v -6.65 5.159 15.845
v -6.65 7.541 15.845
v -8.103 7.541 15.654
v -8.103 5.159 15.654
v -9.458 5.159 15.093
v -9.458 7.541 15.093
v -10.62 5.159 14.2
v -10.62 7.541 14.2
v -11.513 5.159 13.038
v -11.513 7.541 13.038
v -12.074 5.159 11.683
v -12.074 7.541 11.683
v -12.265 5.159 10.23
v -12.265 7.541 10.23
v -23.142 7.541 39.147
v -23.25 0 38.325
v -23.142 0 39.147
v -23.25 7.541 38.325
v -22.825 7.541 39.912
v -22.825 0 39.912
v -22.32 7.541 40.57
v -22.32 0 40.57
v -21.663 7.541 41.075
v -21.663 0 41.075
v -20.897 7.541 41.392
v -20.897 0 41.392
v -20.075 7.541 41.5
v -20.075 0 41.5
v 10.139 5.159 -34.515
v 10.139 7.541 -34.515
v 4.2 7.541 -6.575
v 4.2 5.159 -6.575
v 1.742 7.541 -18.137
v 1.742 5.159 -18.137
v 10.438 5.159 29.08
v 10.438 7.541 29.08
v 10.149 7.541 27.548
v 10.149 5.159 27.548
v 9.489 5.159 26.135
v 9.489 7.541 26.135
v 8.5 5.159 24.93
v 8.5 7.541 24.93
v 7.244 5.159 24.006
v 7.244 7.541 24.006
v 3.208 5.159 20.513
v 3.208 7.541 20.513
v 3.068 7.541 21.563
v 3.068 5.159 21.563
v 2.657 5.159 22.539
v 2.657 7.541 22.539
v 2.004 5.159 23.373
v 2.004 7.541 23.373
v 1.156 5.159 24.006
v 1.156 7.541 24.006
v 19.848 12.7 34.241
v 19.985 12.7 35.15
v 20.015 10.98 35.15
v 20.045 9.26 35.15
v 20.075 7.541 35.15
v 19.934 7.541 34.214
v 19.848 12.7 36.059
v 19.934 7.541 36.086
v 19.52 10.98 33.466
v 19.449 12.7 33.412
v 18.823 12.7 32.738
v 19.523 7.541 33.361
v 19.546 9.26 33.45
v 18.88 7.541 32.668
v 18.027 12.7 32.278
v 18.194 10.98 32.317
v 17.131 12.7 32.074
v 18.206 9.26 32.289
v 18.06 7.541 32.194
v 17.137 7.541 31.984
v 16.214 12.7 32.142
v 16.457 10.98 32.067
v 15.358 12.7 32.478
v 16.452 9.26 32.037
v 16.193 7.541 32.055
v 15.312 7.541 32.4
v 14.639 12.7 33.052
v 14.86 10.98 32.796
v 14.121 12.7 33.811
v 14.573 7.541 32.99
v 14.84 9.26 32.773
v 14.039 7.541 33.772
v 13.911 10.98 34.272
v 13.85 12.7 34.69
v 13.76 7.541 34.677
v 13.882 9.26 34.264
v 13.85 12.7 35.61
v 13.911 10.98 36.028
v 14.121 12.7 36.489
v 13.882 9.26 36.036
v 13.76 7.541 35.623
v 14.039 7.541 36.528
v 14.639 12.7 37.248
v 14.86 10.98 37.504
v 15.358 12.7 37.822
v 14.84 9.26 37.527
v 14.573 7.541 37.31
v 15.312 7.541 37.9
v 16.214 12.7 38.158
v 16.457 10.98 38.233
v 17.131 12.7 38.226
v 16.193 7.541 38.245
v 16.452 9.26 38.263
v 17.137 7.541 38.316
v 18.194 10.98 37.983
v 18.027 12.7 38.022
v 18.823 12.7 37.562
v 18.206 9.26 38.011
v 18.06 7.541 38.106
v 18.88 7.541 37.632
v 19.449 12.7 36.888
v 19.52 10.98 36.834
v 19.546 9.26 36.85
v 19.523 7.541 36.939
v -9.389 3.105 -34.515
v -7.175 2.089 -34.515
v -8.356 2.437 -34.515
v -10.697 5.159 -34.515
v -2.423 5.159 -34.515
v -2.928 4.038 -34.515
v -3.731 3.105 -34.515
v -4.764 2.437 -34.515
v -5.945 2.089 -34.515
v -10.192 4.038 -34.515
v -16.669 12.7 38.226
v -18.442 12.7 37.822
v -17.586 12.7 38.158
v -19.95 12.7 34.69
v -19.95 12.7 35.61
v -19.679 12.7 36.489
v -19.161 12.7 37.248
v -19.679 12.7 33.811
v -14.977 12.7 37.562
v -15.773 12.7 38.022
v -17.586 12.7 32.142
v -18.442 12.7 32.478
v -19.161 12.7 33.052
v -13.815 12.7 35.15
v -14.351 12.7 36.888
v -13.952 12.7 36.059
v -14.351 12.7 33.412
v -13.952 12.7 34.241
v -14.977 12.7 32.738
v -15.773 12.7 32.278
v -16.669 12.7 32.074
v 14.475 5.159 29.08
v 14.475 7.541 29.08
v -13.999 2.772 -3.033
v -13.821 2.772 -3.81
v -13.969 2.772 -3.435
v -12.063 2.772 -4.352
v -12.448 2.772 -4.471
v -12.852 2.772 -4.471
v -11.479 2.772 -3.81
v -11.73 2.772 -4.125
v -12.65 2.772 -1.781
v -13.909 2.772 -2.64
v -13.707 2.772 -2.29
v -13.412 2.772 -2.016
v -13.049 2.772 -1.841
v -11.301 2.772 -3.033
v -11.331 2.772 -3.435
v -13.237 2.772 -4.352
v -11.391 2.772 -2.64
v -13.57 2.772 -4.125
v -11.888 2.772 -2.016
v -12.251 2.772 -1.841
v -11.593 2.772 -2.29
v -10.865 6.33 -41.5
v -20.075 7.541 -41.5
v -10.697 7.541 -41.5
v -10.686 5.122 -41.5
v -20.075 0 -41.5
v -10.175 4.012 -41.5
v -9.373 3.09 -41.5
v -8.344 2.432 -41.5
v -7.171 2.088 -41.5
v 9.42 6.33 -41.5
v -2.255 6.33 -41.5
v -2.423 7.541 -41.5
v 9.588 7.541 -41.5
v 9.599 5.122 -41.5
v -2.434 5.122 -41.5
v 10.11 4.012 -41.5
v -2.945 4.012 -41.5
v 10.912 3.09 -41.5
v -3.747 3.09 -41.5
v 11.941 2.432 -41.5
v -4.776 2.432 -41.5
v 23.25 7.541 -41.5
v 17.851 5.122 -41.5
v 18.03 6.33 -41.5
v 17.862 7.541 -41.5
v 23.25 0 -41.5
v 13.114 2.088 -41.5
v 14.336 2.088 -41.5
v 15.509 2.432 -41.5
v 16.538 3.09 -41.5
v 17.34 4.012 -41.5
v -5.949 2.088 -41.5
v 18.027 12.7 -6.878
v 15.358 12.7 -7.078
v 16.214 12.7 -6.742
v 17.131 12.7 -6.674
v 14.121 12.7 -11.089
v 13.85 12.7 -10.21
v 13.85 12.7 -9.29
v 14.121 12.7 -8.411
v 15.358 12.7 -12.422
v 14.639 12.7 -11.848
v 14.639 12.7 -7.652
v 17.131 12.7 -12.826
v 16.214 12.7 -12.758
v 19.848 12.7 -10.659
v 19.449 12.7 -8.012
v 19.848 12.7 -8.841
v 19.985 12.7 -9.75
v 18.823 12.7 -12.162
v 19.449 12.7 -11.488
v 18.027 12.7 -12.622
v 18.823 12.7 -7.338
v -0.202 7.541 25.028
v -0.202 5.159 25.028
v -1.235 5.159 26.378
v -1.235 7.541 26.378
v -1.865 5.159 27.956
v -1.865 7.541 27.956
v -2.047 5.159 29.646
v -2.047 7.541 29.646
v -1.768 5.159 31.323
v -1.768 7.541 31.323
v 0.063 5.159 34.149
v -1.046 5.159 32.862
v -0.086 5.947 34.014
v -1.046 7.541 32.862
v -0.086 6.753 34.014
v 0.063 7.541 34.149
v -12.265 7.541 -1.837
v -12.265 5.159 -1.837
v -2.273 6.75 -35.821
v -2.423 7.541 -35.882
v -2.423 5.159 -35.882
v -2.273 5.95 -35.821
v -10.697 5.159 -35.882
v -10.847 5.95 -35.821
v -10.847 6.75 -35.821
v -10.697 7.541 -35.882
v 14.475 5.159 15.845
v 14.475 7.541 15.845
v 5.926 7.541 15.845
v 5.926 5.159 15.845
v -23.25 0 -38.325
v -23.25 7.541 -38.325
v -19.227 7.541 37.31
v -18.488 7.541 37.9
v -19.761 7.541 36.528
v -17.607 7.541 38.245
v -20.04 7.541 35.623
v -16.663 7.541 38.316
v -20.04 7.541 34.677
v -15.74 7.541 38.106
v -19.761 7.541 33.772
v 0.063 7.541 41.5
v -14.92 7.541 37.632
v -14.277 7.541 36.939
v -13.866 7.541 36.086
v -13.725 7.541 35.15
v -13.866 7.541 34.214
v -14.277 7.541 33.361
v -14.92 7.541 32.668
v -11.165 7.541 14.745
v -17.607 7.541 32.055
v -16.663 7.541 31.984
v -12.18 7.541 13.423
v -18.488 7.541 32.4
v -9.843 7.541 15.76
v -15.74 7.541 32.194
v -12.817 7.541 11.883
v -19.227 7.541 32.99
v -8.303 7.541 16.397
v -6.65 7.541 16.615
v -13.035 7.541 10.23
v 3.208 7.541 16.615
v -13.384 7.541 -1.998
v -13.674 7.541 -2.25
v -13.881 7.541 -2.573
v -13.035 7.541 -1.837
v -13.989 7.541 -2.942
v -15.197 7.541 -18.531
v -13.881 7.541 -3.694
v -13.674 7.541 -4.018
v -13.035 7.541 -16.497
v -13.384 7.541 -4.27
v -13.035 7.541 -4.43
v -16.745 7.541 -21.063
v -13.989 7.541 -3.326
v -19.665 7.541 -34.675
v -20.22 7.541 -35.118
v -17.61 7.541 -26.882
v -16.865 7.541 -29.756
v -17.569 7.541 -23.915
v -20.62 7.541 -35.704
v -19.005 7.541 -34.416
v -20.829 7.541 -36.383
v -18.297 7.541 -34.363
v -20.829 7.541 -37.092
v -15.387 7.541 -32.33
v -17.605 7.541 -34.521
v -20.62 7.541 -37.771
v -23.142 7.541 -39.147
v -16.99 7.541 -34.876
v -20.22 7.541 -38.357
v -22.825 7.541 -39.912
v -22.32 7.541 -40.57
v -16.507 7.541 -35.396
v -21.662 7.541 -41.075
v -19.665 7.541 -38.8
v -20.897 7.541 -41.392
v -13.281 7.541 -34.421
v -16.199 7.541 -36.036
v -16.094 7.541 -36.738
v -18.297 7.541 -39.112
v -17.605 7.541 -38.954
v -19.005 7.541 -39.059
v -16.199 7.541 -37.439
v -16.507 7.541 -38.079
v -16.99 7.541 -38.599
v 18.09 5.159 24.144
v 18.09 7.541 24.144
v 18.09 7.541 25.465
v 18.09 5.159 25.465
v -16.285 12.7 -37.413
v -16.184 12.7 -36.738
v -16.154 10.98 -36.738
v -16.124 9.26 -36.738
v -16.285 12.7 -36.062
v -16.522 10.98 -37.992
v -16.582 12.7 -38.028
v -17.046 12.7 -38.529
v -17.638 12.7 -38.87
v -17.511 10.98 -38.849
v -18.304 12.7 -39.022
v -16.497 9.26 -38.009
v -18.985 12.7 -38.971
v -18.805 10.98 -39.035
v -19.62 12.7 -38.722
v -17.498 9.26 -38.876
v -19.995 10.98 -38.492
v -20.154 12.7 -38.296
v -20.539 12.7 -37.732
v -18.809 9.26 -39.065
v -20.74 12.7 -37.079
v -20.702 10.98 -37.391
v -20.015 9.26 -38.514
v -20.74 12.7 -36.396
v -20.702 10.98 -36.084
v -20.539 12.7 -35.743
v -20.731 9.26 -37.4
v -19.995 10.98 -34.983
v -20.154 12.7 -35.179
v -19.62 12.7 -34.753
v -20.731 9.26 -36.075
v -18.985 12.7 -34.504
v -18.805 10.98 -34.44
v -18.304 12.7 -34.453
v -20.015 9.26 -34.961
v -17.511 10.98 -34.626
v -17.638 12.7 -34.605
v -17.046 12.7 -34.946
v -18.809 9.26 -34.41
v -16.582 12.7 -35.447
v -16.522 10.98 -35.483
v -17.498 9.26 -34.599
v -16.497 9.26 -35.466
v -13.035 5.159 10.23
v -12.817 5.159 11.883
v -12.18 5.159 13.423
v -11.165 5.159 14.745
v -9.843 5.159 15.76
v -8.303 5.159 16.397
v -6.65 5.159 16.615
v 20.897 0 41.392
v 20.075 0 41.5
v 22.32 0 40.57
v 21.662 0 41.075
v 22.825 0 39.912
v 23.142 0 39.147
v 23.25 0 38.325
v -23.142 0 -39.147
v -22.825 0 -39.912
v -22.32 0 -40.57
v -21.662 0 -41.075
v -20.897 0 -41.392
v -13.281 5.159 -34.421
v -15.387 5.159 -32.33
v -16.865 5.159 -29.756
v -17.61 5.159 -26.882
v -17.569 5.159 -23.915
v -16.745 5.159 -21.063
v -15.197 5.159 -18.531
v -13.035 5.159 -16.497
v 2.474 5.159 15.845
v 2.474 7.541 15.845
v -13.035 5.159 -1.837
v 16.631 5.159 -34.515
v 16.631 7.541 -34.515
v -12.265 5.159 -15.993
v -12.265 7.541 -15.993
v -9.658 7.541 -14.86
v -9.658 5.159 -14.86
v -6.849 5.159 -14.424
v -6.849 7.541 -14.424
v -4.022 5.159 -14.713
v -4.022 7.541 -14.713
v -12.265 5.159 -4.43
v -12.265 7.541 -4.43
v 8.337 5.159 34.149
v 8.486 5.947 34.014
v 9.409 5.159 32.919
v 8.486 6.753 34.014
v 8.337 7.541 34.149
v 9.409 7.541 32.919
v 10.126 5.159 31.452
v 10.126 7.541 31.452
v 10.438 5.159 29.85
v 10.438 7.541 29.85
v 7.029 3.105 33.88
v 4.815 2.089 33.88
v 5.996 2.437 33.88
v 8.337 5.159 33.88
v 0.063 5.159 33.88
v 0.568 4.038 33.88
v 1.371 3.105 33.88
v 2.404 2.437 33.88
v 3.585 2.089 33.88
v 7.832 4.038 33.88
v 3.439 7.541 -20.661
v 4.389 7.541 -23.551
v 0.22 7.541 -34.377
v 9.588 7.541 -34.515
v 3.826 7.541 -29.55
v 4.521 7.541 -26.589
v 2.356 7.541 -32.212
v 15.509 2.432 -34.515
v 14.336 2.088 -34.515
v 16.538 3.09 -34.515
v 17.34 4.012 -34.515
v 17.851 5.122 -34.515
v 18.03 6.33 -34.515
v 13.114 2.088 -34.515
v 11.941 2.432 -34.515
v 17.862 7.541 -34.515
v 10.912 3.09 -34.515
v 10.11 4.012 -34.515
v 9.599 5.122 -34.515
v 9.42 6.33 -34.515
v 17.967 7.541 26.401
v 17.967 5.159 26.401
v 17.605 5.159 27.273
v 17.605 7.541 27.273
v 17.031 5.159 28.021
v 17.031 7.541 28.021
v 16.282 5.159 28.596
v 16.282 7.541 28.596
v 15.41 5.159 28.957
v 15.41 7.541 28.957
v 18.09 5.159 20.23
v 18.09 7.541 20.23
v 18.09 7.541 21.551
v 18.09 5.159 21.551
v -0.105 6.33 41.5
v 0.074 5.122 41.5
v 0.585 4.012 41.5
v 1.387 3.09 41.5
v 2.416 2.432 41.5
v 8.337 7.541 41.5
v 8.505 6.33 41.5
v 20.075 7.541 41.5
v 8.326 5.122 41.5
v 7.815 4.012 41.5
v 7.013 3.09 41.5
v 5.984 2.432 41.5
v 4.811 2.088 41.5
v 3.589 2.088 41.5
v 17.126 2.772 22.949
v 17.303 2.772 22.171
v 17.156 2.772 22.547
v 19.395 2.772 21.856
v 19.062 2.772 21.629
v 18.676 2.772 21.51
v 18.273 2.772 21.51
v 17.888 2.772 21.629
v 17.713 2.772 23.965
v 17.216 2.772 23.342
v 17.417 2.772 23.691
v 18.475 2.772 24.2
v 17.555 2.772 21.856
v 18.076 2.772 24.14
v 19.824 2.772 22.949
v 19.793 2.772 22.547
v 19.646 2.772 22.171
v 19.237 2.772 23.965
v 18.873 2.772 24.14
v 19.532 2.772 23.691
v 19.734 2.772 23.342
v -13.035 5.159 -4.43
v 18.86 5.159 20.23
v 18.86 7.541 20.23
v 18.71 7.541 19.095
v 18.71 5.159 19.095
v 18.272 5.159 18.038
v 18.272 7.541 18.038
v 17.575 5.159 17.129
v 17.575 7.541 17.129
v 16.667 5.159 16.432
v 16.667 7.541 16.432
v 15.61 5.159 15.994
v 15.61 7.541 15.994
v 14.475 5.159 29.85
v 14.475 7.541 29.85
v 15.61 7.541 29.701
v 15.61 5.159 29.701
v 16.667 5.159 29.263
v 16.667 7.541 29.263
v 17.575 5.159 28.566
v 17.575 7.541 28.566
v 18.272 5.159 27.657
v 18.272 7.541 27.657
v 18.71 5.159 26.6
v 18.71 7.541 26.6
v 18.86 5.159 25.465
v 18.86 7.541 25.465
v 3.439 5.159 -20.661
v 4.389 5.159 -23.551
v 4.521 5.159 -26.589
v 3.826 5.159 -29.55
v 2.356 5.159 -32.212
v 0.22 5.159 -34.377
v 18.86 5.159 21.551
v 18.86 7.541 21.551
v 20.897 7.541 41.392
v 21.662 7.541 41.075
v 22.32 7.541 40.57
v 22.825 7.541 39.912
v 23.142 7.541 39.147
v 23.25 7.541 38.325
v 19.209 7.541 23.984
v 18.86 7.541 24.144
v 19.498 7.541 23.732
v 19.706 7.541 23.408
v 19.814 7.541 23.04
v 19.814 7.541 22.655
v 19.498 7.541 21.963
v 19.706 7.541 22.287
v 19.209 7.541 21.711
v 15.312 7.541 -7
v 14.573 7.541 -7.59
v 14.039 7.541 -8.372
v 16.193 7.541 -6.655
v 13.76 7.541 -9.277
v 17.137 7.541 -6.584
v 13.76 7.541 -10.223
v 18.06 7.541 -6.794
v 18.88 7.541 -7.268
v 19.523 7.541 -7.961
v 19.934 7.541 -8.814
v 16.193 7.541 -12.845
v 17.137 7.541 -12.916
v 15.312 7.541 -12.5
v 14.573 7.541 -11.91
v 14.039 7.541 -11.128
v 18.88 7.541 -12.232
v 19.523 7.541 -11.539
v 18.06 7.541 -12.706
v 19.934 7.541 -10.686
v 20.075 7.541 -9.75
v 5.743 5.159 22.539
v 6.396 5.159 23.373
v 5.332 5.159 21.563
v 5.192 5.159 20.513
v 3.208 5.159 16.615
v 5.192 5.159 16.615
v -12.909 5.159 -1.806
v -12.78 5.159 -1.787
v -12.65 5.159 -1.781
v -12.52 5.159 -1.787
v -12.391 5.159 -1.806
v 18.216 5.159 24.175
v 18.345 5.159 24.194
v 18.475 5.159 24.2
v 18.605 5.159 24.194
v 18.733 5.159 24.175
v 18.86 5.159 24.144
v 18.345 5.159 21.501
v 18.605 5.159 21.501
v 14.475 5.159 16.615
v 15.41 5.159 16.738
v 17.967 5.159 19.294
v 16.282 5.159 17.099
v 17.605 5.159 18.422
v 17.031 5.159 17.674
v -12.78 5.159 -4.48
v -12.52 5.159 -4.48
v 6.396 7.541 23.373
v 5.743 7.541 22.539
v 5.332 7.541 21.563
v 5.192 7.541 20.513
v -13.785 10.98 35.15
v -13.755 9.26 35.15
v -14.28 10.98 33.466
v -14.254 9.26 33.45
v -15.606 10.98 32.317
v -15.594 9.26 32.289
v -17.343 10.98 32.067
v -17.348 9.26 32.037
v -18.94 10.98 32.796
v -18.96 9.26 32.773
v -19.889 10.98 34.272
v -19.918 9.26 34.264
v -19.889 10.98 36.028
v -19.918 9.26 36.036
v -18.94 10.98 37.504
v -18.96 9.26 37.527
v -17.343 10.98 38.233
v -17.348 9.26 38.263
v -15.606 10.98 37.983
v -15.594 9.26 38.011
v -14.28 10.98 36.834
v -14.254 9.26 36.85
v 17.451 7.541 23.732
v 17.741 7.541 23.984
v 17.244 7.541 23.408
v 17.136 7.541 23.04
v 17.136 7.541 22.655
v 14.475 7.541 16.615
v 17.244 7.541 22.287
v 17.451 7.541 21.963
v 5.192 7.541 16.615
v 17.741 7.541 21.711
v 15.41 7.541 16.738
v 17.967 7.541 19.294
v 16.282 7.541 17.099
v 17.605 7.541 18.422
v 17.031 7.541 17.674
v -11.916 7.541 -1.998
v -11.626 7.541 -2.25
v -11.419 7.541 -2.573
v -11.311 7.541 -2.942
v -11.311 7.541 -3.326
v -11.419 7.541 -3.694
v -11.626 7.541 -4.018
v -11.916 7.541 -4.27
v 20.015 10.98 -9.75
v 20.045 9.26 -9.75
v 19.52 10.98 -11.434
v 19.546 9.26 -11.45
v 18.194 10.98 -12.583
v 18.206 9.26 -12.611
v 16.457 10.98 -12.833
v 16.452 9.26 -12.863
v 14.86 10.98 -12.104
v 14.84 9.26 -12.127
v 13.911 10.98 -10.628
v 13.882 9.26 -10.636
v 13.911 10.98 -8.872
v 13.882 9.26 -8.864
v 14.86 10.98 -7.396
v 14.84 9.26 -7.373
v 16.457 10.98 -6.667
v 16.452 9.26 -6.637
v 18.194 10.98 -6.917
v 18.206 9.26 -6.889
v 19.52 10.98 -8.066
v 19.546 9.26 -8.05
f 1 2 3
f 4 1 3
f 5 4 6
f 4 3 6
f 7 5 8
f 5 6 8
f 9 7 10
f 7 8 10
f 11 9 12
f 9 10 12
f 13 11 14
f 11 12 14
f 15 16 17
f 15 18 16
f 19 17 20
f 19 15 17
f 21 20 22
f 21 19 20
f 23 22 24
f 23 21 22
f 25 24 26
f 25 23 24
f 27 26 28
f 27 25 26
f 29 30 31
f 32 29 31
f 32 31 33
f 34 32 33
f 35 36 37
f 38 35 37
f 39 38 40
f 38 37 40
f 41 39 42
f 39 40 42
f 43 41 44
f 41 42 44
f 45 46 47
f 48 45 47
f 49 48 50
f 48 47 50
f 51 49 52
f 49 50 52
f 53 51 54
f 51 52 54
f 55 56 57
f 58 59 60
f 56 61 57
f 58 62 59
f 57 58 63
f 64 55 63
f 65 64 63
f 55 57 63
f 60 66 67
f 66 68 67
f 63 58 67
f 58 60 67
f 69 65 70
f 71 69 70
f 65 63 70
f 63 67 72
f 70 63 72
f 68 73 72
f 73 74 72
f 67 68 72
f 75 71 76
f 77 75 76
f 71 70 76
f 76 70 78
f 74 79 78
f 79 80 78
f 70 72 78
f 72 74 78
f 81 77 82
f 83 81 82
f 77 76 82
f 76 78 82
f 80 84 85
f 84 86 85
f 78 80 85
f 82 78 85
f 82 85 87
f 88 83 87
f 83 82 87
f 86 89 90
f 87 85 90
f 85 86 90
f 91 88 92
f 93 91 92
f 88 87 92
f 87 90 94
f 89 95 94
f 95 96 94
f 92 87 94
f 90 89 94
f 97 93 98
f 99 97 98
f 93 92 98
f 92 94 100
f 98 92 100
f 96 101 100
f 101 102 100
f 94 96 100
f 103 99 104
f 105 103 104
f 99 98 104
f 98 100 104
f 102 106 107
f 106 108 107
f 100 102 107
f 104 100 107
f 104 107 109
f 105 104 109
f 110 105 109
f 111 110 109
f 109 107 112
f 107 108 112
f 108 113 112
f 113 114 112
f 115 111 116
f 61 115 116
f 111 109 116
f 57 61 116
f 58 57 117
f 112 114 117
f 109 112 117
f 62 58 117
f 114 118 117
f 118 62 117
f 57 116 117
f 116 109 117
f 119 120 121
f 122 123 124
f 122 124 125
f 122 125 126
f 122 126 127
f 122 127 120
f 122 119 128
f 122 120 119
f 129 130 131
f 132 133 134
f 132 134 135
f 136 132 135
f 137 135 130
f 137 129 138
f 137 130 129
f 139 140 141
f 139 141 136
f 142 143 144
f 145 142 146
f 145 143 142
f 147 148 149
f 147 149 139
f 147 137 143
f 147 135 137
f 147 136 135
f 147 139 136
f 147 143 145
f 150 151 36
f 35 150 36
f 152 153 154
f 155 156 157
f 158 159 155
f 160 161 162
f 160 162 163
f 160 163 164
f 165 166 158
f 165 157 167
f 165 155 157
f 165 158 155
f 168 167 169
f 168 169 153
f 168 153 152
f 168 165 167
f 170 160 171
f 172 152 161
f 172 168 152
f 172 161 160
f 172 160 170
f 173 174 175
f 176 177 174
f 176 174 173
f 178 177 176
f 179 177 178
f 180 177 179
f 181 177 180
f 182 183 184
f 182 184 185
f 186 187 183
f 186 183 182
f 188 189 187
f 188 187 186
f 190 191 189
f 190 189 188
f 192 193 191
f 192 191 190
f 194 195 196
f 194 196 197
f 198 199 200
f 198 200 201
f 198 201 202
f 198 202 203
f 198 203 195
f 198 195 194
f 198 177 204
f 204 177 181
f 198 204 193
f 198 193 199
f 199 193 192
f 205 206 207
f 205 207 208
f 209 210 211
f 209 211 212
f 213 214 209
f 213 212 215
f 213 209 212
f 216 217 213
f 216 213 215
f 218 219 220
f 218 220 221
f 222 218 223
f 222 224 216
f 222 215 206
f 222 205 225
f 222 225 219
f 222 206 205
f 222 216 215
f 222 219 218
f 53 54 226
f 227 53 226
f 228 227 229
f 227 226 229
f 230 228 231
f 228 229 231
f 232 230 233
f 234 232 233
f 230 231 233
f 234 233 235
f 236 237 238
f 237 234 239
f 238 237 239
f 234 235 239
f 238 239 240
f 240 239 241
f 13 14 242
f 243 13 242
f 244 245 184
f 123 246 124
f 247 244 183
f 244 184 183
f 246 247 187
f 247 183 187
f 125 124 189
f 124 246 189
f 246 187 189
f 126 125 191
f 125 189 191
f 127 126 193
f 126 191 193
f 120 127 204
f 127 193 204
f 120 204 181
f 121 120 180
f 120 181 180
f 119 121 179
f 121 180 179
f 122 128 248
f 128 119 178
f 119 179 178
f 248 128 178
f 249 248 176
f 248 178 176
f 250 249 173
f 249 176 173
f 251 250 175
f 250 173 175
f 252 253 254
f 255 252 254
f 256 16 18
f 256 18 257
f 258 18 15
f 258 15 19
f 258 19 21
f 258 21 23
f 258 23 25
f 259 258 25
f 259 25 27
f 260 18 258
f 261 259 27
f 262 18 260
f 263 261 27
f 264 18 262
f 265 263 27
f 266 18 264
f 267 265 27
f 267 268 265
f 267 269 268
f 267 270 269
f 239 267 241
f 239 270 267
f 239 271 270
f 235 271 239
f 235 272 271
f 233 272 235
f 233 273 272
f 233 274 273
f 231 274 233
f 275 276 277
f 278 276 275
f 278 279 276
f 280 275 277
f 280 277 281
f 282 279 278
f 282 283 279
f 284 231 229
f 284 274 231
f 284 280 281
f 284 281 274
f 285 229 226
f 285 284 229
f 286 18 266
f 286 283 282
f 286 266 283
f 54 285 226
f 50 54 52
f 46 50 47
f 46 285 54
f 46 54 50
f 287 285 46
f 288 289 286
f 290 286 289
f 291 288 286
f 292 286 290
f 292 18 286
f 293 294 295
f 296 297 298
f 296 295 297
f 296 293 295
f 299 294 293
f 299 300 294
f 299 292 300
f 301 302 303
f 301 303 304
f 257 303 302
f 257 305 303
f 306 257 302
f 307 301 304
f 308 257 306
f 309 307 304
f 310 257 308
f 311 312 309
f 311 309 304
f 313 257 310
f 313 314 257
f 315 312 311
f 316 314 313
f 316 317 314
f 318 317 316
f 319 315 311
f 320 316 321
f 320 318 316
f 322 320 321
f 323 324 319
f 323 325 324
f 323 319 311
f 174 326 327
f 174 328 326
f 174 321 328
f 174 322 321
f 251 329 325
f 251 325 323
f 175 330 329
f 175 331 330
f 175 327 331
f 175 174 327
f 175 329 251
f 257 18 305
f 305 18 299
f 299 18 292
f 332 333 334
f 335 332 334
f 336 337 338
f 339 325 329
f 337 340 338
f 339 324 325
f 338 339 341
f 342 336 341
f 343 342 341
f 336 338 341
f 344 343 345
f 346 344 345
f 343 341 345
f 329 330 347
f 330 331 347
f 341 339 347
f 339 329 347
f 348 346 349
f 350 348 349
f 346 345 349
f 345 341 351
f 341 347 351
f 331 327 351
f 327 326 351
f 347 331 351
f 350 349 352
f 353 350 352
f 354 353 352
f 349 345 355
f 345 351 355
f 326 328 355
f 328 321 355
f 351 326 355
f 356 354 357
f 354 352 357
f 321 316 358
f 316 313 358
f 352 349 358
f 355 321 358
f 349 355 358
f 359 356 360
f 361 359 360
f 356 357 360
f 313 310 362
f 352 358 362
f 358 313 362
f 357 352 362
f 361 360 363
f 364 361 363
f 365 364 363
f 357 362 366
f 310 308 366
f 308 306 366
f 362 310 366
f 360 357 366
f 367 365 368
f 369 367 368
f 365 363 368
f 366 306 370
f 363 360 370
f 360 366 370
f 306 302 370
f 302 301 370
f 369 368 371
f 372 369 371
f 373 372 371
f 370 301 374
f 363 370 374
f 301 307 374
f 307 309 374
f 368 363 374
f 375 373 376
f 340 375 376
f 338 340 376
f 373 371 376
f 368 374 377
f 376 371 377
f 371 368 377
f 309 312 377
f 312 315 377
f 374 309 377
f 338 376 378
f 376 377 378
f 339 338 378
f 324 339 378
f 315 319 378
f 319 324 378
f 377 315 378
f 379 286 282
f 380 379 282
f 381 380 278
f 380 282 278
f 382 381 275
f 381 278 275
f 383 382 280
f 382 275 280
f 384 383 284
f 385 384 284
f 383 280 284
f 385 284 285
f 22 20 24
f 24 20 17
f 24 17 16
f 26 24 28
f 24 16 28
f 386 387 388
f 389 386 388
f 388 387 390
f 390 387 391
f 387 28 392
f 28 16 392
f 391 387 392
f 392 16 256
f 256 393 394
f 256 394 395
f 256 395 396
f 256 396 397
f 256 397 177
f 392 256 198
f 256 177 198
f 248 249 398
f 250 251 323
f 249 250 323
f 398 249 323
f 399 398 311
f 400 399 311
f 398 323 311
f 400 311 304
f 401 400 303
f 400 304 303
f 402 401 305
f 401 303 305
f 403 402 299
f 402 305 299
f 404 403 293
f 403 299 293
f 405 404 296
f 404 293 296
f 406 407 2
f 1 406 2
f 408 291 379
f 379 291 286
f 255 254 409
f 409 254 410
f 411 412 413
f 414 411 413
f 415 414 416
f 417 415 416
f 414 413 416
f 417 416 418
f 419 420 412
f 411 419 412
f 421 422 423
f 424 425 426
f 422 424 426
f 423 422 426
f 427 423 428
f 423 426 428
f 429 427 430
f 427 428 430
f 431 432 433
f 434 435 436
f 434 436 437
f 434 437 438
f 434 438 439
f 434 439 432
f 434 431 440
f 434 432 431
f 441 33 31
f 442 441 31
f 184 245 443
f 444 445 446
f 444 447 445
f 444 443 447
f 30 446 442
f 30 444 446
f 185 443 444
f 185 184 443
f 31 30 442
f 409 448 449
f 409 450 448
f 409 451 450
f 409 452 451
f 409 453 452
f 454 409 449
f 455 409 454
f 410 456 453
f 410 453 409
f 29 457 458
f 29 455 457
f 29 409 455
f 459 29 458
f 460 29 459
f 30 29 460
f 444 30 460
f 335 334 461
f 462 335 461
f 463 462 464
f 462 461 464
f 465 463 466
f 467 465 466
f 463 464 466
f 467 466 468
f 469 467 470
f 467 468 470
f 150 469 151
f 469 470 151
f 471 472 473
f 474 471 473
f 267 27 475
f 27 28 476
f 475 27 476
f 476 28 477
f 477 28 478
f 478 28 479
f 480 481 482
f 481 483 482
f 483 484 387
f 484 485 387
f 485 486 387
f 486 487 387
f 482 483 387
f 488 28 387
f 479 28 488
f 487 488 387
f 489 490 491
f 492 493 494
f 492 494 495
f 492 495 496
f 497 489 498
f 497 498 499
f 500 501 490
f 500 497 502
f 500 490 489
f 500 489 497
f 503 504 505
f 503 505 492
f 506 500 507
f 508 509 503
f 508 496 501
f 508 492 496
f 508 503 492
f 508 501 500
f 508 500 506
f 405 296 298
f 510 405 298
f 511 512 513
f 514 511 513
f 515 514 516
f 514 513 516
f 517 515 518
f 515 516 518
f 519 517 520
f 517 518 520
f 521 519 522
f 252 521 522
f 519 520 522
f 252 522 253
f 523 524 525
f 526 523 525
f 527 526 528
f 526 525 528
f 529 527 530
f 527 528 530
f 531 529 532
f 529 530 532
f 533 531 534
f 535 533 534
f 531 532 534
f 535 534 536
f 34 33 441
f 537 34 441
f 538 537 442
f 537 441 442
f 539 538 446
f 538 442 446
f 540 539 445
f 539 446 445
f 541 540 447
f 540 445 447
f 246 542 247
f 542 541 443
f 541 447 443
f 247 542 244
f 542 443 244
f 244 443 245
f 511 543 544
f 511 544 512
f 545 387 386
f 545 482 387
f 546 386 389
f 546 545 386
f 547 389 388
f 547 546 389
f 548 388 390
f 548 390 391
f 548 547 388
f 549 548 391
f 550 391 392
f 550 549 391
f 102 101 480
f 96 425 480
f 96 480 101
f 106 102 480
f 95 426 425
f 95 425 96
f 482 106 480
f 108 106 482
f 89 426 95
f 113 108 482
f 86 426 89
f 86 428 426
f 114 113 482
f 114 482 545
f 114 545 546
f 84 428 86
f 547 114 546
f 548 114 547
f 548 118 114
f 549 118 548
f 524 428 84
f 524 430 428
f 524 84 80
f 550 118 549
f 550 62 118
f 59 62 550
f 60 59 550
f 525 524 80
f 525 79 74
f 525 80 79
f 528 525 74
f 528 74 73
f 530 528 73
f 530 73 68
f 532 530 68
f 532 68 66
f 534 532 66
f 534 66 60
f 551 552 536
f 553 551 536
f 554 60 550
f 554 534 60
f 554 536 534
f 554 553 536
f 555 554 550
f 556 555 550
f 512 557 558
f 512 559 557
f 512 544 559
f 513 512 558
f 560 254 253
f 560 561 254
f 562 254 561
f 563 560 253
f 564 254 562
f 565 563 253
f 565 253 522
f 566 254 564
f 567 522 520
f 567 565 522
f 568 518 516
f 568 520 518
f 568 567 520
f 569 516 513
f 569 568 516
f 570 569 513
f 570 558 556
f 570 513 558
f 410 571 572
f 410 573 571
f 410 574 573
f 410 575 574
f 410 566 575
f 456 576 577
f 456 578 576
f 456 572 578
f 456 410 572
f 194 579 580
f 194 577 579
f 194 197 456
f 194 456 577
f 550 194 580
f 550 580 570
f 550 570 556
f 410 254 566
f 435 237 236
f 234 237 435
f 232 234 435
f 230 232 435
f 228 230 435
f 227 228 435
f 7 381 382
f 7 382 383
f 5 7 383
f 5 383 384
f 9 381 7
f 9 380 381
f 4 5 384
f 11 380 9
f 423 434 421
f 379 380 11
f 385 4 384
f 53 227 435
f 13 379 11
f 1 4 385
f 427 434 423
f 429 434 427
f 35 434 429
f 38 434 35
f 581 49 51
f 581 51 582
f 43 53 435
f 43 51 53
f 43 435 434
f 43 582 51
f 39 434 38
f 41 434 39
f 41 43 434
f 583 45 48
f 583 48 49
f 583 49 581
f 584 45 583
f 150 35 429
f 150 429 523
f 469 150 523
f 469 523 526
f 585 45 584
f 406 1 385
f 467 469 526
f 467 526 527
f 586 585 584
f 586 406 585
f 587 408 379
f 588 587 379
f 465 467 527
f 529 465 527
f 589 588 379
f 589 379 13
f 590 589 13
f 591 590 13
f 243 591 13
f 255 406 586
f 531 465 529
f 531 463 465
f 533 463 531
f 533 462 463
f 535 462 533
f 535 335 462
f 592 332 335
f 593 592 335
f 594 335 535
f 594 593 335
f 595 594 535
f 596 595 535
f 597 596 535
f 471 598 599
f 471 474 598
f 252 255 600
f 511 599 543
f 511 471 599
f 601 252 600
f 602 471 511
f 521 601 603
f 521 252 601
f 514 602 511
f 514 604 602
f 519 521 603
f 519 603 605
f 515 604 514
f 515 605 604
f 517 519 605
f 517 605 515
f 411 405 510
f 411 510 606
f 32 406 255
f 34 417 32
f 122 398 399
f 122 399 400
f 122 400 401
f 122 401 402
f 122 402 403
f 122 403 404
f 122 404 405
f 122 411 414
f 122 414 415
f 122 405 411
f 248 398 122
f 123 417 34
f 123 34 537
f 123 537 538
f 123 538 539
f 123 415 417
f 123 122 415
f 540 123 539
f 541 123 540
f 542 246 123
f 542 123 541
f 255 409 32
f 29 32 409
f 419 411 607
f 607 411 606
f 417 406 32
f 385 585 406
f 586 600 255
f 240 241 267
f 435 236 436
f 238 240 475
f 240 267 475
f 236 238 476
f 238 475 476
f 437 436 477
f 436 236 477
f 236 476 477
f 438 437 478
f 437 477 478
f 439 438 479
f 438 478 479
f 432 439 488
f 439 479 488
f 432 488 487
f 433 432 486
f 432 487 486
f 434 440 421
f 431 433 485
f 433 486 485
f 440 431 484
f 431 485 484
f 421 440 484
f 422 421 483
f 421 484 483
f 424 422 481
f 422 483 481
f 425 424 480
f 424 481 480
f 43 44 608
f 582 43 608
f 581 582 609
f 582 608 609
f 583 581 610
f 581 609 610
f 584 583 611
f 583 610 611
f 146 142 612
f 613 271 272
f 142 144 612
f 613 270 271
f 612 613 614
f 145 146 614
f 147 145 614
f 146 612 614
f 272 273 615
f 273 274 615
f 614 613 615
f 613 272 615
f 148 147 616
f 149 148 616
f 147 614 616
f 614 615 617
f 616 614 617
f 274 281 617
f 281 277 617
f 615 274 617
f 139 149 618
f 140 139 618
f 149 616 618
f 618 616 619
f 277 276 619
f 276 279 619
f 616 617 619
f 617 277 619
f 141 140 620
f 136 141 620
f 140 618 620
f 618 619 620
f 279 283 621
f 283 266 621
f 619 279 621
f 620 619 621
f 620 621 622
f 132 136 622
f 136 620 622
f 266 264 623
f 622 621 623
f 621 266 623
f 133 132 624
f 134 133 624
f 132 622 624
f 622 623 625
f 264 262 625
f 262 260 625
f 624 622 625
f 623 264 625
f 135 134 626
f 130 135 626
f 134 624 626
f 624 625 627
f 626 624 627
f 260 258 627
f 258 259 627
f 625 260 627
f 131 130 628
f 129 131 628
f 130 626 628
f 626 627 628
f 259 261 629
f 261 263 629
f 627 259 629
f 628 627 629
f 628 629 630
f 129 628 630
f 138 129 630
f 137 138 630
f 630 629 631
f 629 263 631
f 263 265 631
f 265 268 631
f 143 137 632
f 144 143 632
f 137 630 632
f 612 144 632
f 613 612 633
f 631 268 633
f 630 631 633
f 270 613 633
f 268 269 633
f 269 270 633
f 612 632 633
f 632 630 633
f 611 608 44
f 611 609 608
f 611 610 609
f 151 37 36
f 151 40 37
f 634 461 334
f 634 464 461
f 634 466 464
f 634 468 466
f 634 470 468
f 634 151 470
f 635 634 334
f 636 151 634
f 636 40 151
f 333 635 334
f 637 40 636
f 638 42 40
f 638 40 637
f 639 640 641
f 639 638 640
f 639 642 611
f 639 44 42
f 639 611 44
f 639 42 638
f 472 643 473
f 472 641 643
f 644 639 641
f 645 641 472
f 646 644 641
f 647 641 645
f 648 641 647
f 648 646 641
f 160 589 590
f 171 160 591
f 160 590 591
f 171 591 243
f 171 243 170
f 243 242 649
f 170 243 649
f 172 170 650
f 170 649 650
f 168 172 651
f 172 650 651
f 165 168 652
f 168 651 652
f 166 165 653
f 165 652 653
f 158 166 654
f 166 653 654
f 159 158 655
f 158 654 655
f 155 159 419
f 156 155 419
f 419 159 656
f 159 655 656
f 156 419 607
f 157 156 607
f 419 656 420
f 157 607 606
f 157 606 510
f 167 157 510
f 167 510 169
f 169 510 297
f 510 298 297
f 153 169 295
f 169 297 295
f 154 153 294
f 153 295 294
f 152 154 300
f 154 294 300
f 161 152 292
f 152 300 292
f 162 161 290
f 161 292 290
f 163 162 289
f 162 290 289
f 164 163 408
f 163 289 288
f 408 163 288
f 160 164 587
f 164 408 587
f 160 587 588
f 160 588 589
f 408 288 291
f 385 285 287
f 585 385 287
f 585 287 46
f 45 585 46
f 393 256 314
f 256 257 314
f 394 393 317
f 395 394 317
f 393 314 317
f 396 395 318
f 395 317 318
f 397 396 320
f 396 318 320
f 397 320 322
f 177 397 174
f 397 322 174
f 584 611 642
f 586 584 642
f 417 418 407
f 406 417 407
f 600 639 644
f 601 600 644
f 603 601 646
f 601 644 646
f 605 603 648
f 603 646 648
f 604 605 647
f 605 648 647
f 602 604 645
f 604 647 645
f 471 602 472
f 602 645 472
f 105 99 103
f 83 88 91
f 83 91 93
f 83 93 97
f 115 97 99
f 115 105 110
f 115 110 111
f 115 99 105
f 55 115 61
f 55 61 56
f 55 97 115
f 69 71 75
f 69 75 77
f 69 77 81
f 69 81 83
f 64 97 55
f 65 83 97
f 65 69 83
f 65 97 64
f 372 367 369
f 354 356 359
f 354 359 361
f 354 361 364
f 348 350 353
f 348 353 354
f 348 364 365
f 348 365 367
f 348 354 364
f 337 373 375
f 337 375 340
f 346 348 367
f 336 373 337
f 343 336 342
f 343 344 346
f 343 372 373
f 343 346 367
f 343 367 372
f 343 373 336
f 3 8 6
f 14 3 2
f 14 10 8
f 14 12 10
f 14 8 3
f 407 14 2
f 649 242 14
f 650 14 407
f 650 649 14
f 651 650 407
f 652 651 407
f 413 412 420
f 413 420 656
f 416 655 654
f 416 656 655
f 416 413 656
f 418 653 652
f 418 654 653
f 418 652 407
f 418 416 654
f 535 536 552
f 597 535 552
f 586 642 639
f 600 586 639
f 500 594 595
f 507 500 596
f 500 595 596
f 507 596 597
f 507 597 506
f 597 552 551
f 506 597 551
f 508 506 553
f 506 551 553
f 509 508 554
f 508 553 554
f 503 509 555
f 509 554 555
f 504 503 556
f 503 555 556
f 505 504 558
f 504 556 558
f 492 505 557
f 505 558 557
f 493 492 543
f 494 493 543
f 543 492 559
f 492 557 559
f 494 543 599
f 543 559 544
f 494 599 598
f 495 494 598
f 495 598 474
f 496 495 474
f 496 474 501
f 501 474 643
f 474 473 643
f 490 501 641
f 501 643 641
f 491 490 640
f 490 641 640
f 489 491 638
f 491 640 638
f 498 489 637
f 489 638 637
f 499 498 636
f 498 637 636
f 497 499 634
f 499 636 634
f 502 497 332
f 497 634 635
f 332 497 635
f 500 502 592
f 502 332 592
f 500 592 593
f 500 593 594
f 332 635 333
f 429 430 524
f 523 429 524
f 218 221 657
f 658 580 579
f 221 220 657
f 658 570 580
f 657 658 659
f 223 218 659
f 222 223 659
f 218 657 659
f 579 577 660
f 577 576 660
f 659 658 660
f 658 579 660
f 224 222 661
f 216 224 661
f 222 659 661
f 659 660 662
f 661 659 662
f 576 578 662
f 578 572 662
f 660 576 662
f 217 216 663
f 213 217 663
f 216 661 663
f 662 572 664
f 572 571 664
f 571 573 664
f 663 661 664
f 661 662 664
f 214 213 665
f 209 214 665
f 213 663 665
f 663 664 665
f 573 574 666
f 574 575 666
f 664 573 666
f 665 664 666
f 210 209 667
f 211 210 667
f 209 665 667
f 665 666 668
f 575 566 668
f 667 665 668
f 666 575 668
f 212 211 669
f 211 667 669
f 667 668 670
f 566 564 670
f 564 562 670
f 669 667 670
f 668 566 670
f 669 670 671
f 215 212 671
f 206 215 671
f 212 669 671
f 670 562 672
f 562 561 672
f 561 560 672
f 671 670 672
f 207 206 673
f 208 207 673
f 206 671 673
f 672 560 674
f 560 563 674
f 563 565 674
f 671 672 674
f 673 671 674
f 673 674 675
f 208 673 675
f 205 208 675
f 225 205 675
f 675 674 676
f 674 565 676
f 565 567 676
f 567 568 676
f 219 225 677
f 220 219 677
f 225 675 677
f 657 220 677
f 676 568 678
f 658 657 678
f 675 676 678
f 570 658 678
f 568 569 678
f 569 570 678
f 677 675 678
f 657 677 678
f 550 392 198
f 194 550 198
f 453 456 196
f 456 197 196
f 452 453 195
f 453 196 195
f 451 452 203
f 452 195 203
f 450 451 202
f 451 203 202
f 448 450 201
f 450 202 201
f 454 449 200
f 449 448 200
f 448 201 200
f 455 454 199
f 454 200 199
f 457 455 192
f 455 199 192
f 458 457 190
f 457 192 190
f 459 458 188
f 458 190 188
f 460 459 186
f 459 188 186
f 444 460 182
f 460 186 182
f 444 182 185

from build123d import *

# Parameters (mm, degrees)
SKETCH1_W                     = 46.5
SKETCH1_H                     = 83
BOSS_EXTRUDE1_DEPTH           = 7.540625
CUT_EXTRUDE3_START            = 7.540625
CUT_EXTRUDE3_DEPTH            = 2.38125
SKETCH10_R                    = 1.35255
CUT_EXTRUDE6_DEPTH            = 4.76885
SKETCH11_W                    = 6.985
SKETCH11_H                    = 5.382155198
CUT_EXTRUDE7_DEPTH            = 2.38125
SKETCH12_R                    = 3.175
BOSS_EXTRUDE2_DEPTH           = 5.159375
BOSS_EXTRUDE2_DRAFT           = 1
BOSS_EXTRUDE2_PROFILE_2_DEPTH = 5.159375
BOSS_EXTRUDE2_PROFILE_2_DRAFT = 1
BOSS_EXTRUDE2_PROFILE_3_DEPTH = 5.159375
BOSS_EXTRUDE2_PROFILE_3_DRAFT = 1
SKETCH12_R_2                  = 2.38125
BOSS_EXTRUDE2_PROFILE_4_DEPTH = 5.159375
BOSS_EXTRUDE2_PROFILE_4_DRAFT = 1
FILLET1_R                     = 3.175
SKETCH13_R                    = 4.3053
CUT_EXTRUDE8_DEPTH            = 6.985
SKETCH14_R                    = 4.3053
CUT_EXTRUDE9_DEPTH            = 7.62


with BuildPart() as part:
    # Sketch1 → Boss-Extrude1 (new body)
    with BuildSketch(Plane(origin=(0, 0, 0), x_dir=(1, 0, 0), z_dir=(0, 1, 0))):
        Rectangle(SKETCH1_W, SKETCH1_H)
    extrude(amount=BOSS_EXTRUDE1_DEPTH)

    # Sketch2 → Cut-Extrude3 (cut)
    with BuildSketch(Plane(origin=(0, 0, 0), x_dir=(1, 0, 0), z_dir=(0, 1, 0)).offset(CUT_EXTRUDE3_START)):
        with BuildLine():
            Line((5.926342072, -15.8450122), (16.691855897, 34.802748287))
            ThreePointArc((16.691855897, 34.802748287), (16.847821053, 35.78747353), (16.9, 36.783107142))
            Line((16.9, 36.783107142), (16.9, 41.5))
            Line((16.9, 41.5), (10.55, 41.5))
            Line((10.55, 41.5), (10.55, 36.783107142))
            ThreePointArc((10.55, 36.783107142), (10.532607018, 36.451229271), (10.480618632, 36.122987524))
            Line((10.480618632, 36.122987524), (4.2, 6.575))
            Line((4.2, 6.575), (1.742353127, 18.137319476))
            ThreePointArc((1.742353127, 18.137319476), (-7.787687338, 36.612083158), (-13.035, 16.49730565))
            Line((-13.035, 16.49730565), (-13.035, -10.23))
            ThreePointArc((-13.035, -10.23), (-11.164876798, -14.744876798), (-6.65, -16.615))
            Line((-6.65, -16.615), (3.2078125, -16.615))
            Line((3.2078125, -16.615), (3.2078125, -20.512873774))
            ThreePointArc((3.2078125, -20.512873774), (2.656919843, -22.538622657), (1.155983232, -24.006386448))
            ThreePointArc((1.155983232, -24.006386448), (-2.044457088, -29.201835269), (0.7075, -34.648140337))
            Line((0.7075, -34.648140337), (0.7075, -41.5))
            Line((0.7075, -41.5), (7.6925, -41.5))
            Line((7.6925, -41.5), (7.6925, -34.648140337))
            ThreePointArc((7.6925, -34.648140337), (9.624653372, -32.569132052), (10.438131483, -29.8499878))
            Line((10.438131483, -29.8499878), (14.4748, -29.8499878))
            ThreePointArc((14.4748, -29.8499878), (17.575454609, -28.565654609), (18.8597878, -25.465))
            Line((18.8597878, -25.465), (18.8597878, -20.23))
            ThreePointArc((18.8597878, -20.23), (17.575454609, -17.129345391), (14.4748, -15.8450122))
            Line((14.4748, -15.8450122), (5.926342072, -15.8450122))
        make_face()
        with BuildLine():
            Line((14.4748, -29.08), (10.43813073, -29.08))
            ThreePointArc((10.43813073, -29.08), (9.489135484, -26.135203334), (7.244016768, -24.006386448))
            ThreePointArc((7.244016768, -24.006386448), (5.743080157, -22.538622657), (5.1921875, -20.512873774))
            Line((5.1921875, -20.512873774), (5.1921875, -16.615))
            Line((5.1921875, -16.615), (14.4748, -16.615))
            ThreePointArc((14.4748, -16.615), (17.030991014, -17.673808986), (18.0898, -20.23))
            Line((18.0898, -20.23), (18.0898, -25.465))
            ThreePointArc((18.0898, -25.465), (17.030991014, -28.021191014), (14.4748, -29.08))
        make_face(mode=Mode.SUBTRACT)
        with BuildLine():
            Line((-4.021712531, 14.713303237), (2.473657928, -15.8450122))
            Line((2.473657928, -15.8450122), (-6.65, -15.8450122))
            ThreePointArc((-6.65, -15.8450122), (-10.620413203, -14.200413203), (-12.2650122, -10.23))
            Line((-12.2650122, -10.23), (-12.2650122, 15.993340762))
            ThreePointArc((-12.2650122, 15.993340762), (-8.267823292, 14.551807439), (-4.021712531, 14.713303237))
        make_face(mode=Mode.SUBTRACT)
    extrude(amount=-CUT_EXTRUDE3_DEPTH, mode=Mode.SUBTRACT)

    # Sketch10 → Cut-Extrude6 (cut)
    with BuildSketch(Plane(origin=(0, 7.540625, 0), x_dir=(1, 0, 0), z_dir=(0, 1, 0))):
        with Locations(Location((18.4747939, -22.8475, 0), (0, 0, 270))):
            Circle(SKETCH10_R)
        with Locations(Location((-12.6500061, 3.133652825, 0), (0, 0, 270))):
            Circle(SKETCH10_R)
    extrude(amount=-CUT_EXTRUDE6_DEPTH, mode=Mode.SUBTRACT)

    # Sketch11 → Cut-Extrude7 (cut)
    with BuildSketch(Plane(origin=(0, 7.540625, 0), x_dir=(1, 0, 0), z_dir=(0, 1, 0))):
        with Locations((-6.56, 38.808922401)):
            Rectangle(SKETCH11_W, SKETCH11_H)
    extrude(amount=-CUT_EXTRUDE7_DEPTH, mode=Mode.SUBTRACT)


with BuildPart() as boss_extrude2_tool:
    # Sketch12 → Boss-Extrude2 (with draft: the straight prism first)
    with BuildSketch(Plane(origin=(0, 7.540625, 0), x_dir=(1, 0, 0), z_dir=(0, 1, 0))):
        with Locations((-16.9, -35.15)):
            Circle(SKETCH12_R)
    extrude(amount=BOSS_EXTRUDE2_DEPTH)
    # Boss-Extrude2: the draft: its side faces are tilted about the plane it starts from
    boss_extrude2_sides = [boss_extrude2_tool.faces().sort_by_distance(p)[0] for p in [
        (-20.075, 10.1203125, 35.15),
    ]]
    draft(boss_extrude2_sides, Plane(origin=(0, 7.540625, 0), x_dir=(1, 0, 0), z_dir=(0, 1, 0)), BOSS_EXTRUDE2_DRAFT)


with BuildPart() as part_1:
    add(part.part)

    # Boss-Extrude2: add boss_extrude2_tool
    add(boss_extrude2_tool.part)


with BuildPart() as boss_extrude2_profile_2_tool:
    # Sketch12 → Boss-Extrude2 profile 2 (with draft: the straight prism first)
    with BuildSketch(Plane(origin=(0, 7.540625, 0), x_dir=(1, 0, 0), z_dir=(0, 1, 0))):
        with Locations((16.9, -35.15)):
            Circle(SKETCH12_R)
    extrude(amount=BOSS_EXTRUDE2_PROFILE_2_DEPTH)
    # Boss-Extrude2 profile 2: the draft: its side faces are tilted about the plane it starts from
    boss_extrude2_profile_2_sides = [boss_extrude2_profile_2_tool.faces().sort_by_distance(p)[0] for p in [
        (13.725, 10.1203125, 35.15),
    ]]
    draft(boss_extrude2_profile_2_sides, Plane(origin=(0, 7.540625, 0), x_dir=(1, 0, 0), z_dir=(0, 1, 0)), BOSS_EXTRUDE2_PROFILE_2_DRAFT)


with BuildPart() as part_2:
    add(part_1.part)

    # Boss-Extrude2 profile 2: add boss_extrude2_profile_2_tool
    add(boss_extrude2_profile_2_tool.part)


with BuildPart() as boss_extrude2_profile_3_tool:
    # Sketch12 → Boss-Extrude2 profile 3 (with draft: the straight prism first)
    with BuildSketch(Plane(origin=(0, 7.540625, 0), x_dir=(1, 0, 0), z_dir=(0, 1, 0))):
        with Locations((16.9, 9.75)):
            Circle(SKETCH12_R)
    extrude(amount=BOSS_EXTRUDE2_PROFILE_3_DEPTH)
    # Boss-Extrude2 profile 3: the draft: its side faces are tilted about the plane it starts from
    boss_extrude2_profile_3_sides = [boss_extrude2_profile_3_tool.faces().sort_by_distance(p)[0] for p in [
        (13.725, 10.1203125, -9.75),
    ]]
    draft(boss_extrude2_profile_3_sides, Plane(origin=(0, 7.540625, 0), x_dir=(1, 0, 0), z_dir=(0, 1, 0)), BOSS_EXTRUDE2_PROFILE_3_DRAFT)


with BuildPart() as part_3:
    add(part_2.part)

    # Boss-Extrude2 profile 3: add boss_extrude2_profile_3_tool
    add(boss_extrude2_profile_3_tool.part)


with BuildPart() as boss_extrude2_profile_4_tool:
    # Sketch12 → Boss-Extrude2 profile 4 (with draft: the straight prism first)
    with BuildSketch(Plane(origin=(0, 7.540625, 0), x_dir=(1, 0, 0), z_dir=(0, 1, 0))):
        with Locations((-18.4748, 36.7375)):
            Circle(SKETCH12_R_2)
    extrude(amount=BOSS_EXTRUDE2_PROFILE_4_DEPTH)
    # Boss-Extrude2 profile 4: the draft: its side faces are tilted about the plane it starts from
    boss_extrude2_profile_4_sides = [boss_extrude2_profile_4_tool.faces().sort_by_distance(p)[0] for p in [
        (-20.85605, 10.1203125, -36.7375),
    ]]
    draft(boss_extrude2_profile_4_sides, Plane(origin=(0, 7.540625, 0), x_dir=(1, 0, 0), z_dir=(0, 1, 0)), BOSS_EXTRUDE2_PROFILE_4_DRAFT)


with BuildPart() as part_4:
    add(part_3.part)

    # Boss-Extrude2 profile 4: add boss_extrude2_profile_4_tool
    add(boss_extrude2_profile_4_tool.part)

    # Fillet1
    fillet1_edges = [part_4.edges().sort_by_distance(p)[0] for p in [
        (23.25, 3.7703125, 41.5),
        (-23.25, 3.7703125, 41.5),
        (-23.25, 3.7703125, -41.5),
    ]]
    fillet(fillet1_edges, radius=FILLET1_R)

    # Sketch13 → Cut-Extrude8 (cut)
    with BuildSketch(Plane(origin=(0, 0, -41.5), x_dir=(-1, 0, 0), z_dir=(0, 0, -1))):
        with Locations((-13.725, 6.35)):
            Circle(SKETCH13_R)
        with Locations((6.56, 6.35)):
            Circle(SKETCH13_R)
    extrude(amount=-CUT_EXTRUDE8_DEPTH, mode=Mode.SUBTRACT)

    # Sketch14 → Cut-Extrude9 (cut)
    with BuildSketch(Plane.XY.offset(41.5)):
        with Locations((4.2, 6.35)):
            Circle(SKETCH14_R)
    extrude(amount=-CUT_EXTRUDE9_DEPTH, mode=Mode.SUBTRACT)


solid = part_4.part
